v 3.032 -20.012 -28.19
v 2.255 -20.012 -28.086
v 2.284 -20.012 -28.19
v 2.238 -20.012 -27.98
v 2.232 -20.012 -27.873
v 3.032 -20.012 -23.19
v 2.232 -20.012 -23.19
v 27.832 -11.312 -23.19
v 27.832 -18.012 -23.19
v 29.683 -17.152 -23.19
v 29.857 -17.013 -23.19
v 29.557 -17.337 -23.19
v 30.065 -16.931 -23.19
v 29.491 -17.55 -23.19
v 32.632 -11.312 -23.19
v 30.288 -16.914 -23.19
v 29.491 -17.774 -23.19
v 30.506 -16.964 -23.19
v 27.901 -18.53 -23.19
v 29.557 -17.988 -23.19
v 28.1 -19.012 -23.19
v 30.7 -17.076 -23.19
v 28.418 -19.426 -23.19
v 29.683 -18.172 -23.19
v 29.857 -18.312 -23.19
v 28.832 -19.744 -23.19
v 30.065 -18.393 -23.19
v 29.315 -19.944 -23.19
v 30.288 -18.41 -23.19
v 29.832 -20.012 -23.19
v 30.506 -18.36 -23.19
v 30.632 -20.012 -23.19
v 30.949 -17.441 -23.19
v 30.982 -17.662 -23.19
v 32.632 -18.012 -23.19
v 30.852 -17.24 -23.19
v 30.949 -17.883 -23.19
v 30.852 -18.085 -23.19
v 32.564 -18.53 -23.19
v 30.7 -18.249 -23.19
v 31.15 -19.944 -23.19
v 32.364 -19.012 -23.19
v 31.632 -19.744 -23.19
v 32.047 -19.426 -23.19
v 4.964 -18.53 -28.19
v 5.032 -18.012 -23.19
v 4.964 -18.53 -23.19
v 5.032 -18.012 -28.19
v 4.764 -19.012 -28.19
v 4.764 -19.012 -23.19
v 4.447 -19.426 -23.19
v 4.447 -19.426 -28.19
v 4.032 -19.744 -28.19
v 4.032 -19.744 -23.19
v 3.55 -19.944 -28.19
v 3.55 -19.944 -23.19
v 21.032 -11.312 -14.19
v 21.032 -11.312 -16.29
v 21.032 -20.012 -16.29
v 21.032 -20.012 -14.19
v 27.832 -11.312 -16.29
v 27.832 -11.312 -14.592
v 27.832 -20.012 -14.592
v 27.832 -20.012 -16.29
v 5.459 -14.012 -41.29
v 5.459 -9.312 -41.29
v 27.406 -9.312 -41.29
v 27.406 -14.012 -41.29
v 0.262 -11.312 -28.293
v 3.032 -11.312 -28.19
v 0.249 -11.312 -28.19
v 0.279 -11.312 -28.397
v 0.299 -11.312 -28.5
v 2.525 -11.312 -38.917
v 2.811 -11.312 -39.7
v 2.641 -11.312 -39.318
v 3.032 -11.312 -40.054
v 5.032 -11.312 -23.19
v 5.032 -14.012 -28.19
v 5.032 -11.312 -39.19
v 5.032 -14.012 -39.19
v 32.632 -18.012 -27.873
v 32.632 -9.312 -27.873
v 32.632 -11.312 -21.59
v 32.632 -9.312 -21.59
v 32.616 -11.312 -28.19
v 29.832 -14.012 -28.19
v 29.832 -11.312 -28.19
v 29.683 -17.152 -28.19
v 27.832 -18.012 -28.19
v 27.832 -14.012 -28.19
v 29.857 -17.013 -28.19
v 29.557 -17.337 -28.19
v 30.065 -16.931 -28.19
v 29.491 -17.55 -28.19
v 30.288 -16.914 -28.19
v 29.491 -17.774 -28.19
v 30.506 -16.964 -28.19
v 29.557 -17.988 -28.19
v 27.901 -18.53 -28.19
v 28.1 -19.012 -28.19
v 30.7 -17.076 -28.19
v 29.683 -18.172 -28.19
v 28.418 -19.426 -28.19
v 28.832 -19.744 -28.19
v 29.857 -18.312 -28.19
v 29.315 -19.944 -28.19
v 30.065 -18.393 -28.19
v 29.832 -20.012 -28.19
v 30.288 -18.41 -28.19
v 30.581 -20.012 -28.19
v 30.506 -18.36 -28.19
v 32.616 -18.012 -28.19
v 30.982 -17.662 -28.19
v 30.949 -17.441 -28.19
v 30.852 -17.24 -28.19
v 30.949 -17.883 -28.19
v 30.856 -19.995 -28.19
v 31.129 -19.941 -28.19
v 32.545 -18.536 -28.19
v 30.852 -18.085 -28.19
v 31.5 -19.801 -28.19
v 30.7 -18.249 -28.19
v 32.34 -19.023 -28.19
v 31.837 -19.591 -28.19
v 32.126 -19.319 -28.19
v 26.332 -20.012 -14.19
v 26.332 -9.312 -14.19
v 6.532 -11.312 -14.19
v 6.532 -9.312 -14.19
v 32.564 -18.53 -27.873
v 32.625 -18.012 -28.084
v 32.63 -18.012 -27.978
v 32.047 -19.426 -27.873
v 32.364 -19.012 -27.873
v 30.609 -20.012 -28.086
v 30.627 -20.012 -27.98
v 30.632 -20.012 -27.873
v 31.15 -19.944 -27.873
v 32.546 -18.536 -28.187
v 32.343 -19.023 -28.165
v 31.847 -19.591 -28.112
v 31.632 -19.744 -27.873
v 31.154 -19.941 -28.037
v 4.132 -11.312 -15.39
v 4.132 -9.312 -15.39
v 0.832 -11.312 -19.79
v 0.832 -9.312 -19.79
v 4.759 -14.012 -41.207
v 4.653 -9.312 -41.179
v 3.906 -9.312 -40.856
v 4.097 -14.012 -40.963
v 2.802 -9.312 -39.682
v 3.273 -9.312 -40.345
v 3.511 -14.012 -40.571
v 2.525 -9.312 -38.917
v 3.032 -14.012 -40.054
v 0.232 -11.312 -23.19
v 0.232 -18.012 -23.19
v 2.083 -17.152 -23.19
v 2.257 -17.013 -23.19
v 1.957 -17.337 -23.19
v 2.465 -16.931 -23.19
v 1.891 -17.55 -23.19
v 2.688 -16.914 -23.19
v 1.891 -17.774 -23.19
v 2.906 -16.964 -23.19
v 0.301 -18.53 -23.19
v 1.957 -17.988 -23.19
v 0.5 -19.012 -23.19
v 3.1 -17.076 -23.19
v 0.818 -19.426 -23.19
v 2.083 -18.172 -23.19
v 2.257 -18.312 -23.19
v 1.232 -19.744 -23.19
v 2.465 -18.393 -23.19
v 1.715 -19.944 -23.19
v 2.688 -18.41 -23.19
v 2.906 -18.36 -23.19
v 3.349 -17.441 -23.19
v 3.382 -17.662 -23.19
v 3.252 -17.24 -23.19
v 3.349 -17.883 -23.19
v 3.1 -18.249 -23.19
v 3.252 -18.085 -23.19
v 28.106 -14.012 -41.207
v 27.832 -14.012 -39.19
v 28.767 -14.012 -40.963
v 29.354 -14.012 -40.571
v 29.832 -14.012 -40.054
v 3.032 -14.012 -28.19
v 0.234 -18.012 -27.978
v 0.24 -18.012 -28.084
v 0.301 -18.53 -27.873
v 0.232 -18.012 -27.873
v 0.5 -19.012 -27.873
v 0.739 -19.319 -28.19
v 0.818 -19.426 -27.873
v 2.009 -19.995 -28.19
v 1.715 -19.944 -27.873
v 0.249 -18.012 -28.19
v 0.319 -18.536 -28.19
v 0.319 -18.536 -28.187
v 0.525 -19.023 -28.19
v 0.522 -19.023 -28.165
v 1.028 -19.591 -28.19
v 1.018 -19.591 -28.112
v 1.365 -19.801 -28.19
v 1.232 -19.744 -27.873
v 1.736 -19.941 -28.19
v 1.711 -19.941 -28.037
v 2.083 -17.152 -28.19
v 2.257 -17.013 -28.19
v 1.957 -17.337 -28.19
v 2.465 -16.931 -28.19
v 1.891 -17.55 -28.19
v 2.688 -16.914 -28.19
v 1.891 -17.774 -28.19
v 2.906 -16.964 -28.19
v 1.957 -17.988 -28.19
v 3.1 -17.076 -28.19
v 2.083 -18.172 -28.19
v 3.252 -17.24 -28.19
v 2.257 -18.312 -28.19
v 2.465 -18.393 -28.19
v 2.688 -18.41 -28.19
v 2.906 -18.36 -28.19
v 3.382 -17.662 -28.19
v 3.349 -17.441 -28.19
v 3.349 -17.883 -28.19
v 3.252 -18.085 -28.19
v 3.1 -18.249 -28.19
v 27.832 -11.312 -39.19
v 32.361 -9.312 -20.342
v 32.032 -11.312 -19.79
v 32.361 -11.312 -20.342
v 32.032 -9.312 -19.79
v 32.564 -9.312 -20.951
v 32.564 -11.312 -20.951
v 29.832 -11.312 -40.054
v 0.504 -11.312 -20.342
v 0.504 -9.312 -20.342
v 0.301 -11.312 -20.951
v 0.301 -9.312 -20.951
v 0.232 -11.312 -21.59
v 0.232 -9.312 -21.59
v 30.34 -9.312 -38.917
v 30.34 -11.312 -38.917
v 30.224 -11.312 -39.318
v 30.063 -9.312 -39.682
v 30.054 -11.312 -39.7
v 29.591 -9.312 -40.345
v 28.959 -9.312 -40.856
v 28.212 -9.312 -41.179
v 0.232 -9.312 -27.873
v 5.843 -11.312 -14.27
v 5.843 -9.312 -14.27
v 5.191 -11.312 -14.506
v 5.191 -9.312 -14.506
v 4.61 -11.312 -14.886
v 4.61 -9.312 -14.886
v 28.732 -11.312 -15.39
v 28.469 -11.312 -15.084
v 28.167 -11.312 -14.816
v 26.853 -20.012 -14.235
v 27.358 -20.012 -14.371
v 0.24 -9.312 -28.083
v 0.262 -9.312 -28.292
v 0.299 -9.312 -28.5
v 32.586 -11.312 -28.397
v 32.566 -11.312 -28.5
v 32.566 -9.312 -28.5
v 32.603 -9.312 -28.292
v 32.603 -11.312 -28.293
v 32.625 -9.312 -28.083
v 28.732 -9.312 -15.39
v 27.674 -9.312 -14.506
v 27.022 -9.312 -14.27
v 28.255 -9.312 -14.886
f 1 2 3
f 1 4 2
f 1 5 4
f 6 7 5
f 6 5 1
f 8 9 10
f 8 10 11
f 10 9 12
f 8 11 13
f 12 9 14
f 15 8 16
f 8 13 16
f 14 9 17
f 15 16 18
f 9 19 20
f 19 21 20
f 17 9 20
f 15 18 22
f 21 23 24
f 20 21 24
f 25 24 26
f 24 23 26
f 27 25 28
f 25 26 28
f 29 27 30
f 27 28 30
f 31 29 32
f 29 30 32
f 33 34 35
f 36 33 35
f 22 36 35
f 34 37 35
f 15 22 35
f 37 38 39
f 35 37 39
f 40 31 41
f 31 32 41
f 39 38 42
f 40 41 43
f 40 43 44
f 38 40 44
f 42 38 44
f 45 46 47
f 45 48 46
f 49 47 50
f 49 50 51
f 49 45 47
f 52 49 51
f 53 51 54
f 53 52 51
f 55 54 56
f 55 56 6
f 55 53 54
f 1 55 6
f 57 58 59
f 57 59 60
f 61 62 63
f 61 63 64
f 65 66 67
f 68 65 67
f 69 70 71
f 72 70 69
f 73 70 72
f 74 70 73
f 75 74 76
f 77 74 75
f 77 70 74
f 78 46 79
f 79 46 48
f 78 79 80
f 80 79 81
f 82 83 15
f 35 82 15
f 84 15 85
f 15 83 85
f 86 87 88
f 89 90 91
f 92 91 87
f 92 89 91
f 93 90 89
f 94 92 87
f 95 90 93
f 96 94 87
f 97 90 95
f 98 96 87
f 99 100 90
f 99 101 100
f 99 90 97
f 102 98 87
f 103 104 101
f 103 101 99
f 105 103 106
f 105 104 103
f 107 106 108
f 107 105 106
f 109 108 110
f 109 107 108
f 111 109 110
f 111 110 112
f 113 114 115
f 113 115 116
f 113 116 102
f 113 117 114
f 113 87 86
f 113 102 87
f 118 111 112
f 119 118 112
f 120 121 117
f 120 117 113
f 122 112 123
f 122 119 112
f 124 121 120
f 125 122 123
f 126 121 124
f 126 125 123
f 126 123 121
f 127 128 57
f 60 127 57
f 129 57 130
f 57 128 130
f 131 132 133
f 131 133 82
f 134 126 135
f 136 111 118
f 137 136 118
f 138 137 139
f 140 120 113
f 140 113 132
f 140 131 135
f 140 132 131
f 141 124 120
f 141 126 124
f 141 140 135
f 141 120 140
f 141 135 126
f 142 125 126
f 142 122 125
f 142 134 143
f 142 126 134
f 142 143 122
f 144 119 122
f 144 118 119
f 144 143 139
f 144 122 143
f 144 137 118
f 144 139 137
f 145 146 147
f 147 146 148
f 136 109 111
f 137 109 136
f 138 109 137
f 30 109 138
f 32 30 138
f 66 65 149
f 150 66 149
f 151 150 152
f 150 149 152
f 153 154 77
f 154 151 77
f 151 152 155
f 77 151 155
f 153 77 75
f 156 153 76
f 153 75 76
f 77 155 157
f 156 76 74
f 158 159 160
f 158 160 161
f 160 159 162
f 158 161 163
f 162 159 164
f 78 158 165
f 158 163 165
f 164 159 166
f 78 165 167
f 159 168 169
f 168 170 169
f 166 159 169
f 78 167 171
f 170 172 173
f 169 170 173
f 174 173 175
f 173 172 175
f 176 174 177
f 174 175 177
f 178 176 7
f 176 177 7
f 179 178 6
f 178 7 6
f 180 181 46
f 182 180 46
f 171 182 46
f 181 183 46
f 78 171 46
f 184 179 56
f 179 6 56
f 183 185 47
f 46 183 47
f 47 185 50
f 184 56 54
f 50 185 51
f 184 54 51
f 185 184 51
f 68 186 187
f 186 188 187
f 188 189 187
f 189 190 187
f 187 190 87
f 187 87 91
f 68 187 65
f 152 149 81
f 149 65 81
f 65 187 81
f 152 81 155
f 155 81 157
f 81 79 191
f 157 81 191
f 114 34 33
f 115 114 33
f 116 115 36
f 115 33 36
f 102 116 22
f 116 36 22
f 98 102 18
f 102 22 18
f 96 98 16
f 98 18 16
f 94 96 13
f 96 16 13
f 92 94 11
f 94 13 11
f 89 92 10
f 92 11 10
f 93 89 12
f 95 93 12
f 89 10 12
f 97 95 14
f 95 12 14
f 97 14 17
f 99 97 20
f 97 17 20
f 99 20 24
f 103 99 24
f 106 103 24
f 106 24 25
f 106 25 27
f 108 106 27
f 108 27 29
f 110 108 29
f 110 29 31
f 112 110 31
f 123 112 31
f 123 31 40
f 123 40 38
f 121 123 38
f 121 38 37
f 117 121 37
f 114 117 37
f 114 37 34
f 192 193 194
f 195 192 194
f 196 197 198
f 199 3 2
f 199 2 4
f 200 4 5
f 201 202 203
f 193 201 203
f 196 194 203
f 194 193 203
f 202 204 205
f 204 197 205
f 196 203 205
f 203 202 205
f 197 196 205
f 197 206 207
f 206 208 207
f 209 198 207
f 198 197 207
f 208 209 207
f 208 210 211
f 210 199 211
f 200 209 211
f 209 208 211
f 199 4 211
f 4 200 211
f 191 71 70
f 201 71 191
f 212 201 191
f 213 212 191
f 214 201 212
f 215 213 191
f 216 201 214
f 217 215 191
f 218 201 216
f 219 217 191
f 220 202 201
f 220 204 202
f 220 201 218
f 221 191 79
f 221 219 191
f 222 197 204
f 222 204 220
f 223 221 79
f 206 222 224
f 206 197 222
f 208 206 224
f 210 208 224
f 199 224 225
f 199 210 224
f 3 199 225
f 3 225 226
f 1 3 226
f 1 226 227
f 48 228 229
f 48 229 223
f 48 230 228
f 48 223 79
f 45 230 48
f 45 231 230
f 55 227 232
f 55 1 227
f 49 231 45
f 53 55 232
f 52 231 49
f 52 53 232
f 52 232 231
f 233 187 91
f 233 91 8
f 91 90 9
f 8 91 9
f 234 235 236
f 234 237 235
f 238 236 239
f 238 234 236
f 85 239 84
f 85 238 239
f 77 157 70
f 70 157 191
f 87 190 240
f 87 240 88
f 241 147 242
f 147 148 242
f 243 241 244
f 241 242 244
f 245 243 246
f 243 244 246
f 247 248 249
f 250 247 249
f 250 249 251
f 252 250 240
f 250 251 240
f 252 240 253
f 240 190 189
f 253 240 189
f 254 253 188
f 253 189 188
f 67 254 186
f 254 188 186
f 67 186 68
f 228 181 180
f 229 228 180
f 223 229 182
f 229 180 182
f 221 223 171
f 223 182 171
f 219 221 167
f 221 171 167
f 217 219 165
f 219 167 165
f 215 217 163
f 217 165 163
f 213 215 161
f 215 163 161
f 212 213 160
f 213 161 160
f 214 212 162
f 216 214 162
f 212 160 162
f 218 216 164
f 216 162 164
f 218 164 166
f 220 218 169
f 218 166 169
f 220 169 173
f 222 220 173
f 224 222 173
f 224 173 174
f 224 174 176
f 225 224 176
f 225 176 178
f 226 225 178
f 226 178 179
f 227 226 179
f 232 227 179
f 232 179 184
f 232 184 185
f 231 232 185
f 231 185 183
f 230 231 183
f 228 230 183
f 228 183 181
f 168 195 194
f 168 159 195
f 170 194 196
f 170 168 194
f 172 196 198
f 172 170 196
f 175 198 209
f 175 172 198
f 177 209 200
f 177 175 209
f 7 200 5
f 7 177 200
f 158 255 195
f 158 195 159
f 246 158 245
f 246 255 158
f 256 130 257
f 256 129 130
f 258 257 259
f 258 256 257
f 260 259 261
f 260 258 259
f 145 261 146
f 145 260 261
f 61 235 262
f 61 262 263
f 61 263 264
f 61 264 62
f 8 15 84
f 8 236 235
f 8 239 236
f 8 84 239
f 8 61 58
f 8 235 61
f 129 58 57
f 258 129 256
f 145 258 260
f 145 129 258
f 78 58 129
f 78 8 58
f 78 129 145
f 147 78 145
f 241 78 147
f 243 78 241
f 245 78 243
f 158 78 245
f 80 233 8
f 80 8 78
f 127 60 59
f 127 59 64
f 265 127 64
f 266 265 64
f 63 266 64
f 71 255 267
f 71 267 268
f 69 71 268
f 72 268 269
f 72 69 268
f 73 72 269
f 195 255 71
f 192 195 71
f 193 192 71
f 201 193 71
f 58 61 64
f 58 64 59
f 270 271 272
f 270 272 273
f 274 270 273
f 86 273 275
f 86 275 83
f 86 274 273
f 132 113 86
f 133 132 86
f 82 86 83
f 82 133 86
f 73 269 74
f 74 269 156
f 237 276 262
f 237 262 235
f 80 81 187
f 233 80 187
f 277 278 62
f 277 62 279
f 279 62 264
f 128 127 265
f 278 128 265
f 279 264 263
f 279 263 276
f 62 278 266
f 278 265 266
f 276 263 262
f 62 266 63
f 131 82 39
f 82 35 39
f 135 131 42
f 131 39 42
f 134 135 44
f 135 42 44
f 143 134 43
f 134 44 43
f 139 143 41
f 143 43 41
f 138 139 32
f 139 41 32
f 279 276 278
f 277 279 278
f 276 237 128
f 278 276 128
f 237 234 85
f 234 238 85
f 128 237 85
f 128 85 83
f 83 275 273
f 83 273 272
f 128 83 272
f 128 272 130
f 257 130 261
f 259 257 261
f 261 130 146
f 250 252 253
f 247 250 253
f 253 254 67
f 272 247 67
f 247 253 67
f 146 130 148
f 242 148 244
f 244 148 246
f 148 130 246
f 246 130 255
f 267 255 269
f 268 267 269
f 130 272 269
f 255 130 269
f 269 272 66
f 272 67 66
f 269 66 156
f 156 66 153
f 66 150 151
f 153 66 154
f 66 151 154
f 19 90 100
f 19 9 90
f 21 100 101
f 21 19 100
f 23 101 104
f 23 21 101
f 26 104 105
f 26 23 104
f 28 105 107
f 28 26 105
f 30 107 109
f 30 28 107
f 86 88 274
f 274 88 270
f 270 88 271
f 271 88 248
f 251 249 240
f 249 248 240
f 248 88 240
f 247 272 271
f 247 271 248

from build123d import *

# Parameters (mm, degrees)
BOSS_EXTRUDE1_START     = -14.7
BOSS_EXTRUDE1_OUTLINE_W = 32.4
BOSS_EXTRUDE1_OUTLINE_H = 27.1
BOSS_EXTRUDE1_DEPTH     = 14.7
CUT_EXTRUDE1_DEPTH      = 12.7
MOVE_FACE1_BY           = 4
MOVE_FACE1_2_BY         = 4
SKETCH3_W               = 2.8
SKETCH3_H               = 13.1
CUT_EXTRUDE2_DEPTH      = 13.7
CUT_EXTRUDE3_DEPTH      = 6
SKETCH5_R               = 0.75
CUT_EXTRUDE4_DEPTH      = 43.343439739
BOSS_EXTRUDE2_DEPTH     = 2
FILLET1_R               = 3
FILLET2_R               = 3
FILLET3_START           = -21
FILLET3_DEPTH           = 13
FILLET4_START           = -21
FILLET4_DEPTH           = 13
FILLET5_R               = 3
FILLET6_R               = 3
FILLET7_R               = 2


with BuildPart() as part:
    # Boss-Extrude1: read off the stored shape, not the designer's step
    # Boss-Extrude1 outline → Boss-Extrude1 (new body)
    with BuildSketch(Plane.XZ.offset(24.012143299).offset(BOSS_EXTRUDE1_START)):
        with Locations((16.432361385, -27.739579566)):
            Rectangle(BOSS_EXTRUDE1_OUTLINE_W, BOSS_EXTRUDE1_OUTLINE_H)
    extrude(amount=BOSS_EXTRUDE1_DEPTH)

    # Sketch2 → Cut-Extrude1 (cut)
    with BuildSketch(Plane.XZ.offset(24.012143299)):
        Polygon((27.832361385, -23.189579566), (32.632361385, -23.189579566), (32.632361385, -20.589579566), (27.832361385, -20.589579566), (27.832361385, -16.289579566), (5.032361385, -16.289579566), (5.032361385, -20.589579566), (0.232361385, -20.589579566), (0.232361385, -23.189579566), (5.032361385, -23.189579566), (5.032361385, -39.189579566), (27.832361385, -39.189579566), align=None)
    extrude(amount=-CUT_EXTRUDE1_DEPTH, mode=Mode.SUBTRACT)

    # Move Face1: a face moved inward by 4.0
    extrude(part.faces().sort_by_distance((16.432361385, -24.012143299, -39.479579566))[0], amount=MOVE_FACE1_BY, dir=(0, 1, 0), mode=Mode.SUBTRACT)

    # Move Face1 2: a face moved inward by 4.0
    extrude(part.faces().sort_by_distance((16.432361385, -24.012143299, -15.789579566))[0], amount=MOVE_FACE1_2_BY, dir=(0, 1, 0), mode=Mode.SUBTRACT)

    # Sketch3 → Cut-Extrude2 (cut)
    with BuildSketch(Plane.XZ.offset(20.012143299)):
        with Locations((1.632361385, -34.739579566)):
            Rectangle(SKETCH3_W, SKETCH3_H)
        with Locations((31.232361385, -34.739579566)):
            Rectangle(SKETCH3_W, SKETCH3_H)
        Polygon((0.232361385, -20.589579566), (5.032361385, -20.589579566), (5.032361385, -16.289579566), (21.032361385, -16.289579566), (21.032361385, -14.189579566), (0.232361385, -14.189579566), align=None)
        Polygon((27.832361385, -14.189579566), (32.632361385, -14.189579566), (32.632361385, -20.589579566), (27.832361385, -20.589579566), (27.832361385, -16.289579566), align=None)
    extrude(amount=-CUT_EXTRUDE2_DEPTH, mode=Mode.SUBTRACT)

    # Sketch4 → Cut-Extrude3 (cut)
    with BuildSketch(Plane.XZ.offset(20.012143299)):
        Polygon((3.032361385, -28.189579566), (5.032361385, -28.189579566), (5.032361385, -39.189579566), (27.832361385, -39.189579566), (27.832361385, -28.189579566), (29.832361385, -28.189579566), (29.832361385, -41.289579566), (3.032361385, -41.289579566), align=None)
    extrude(amount=-CUT_EXTRUDE3_DEPTH, mode=Mode.SUBTRACT)

    # Sketch5 → Cut-Extrude4 (cut, through all)
    with BuildSketch(Plane.XY.offset(-23.189579566)):
        with Locations((2.632361385, -17.662143299)):
            Circle(SKETCH5_R)
        with Locations((30.232361385, -17.662143299)):
            Circle(SKETCH5_R)
    extrude(amount=-CUT_EXTRUDE4_DEPTH, mode=Mode.SUBTRACT)

    # Sketch6 → Boss-Extrude2 (add)
    with BuildSketch(Plane(origin=(0, -9.312143299, 0), x_dir=(1, 0, 0), z_dir=(0, 1, 0))):
        Polygon((21.032361385, 14.189579566), (5.032361385, 14.189579566), (0.232361385, 20.589579566), (5.032361385, 20.589579566), (5.032361385, 16.289579566), (21.032361385, 16.289579566), align=None)
        Polygon((0.232361385, 28.189579566), (3.032361385, 41.289579566), (3.032361385, 28.189579566), align=None)
        Polygon((29.832361385, 41.289579566), (29.832361385, 28.189579566), (32.632361385, 28.189579566), align=None)
        Polygon((27.832361385, 20.589579566), (27.832361385, 14.189579566), (32.632361385, 20.589579566), align=None)
    extrude(amount=-BOSS_EXTRUDE2_DEPTH)

    # Fillet1
    # the kernel refuses this fillet: 3 mm, written as the material it takes off along each edge
    with BuildSketch(Plane(origin=(29.832361385, -17.378495337, -41.289579566), x_dir=(0.20901925718607187, 0, 0.9779115246919747), z_dir=(0, 1, 0))) as fillet1_piece_1:
        with BuildLine():
            CenterArc((FILLET1_R * 0.808846938434, -FILLET1_R), FILLET1_R, 90, 77.935115589)
            Line((-FILLET1_R * 0.169064586258, -FILLET1_R * 0.790980742814), (0, 0))
            Line((0, 0), (FILLET1_R * 0.808846938434, 0))
        make_face()
    extrude(amount=14.132704077, mode=Mode.SUBTRACT)

    # Fillet2
    # the kernel refuses this fillet: 3 mm, written as the material it takes off along each edge
    with BuildSketch(Plane(origin=(3.032361385, -17.378495337, -41.289579566), x_dir=(1.0, 0, -8.828560948914946e-12), z_dir=(0, 1, 0))) as fillet2_piece_1:
        with BuildLine():
            CenterArc((FILLET2_R * 0.808846938434, -FILLET2_R), FILLET2_R, 89.999999999, 77.935115589)
            Line((-FILLET2_R * 0.169064586256, -FILLET2_R * 0.790980742805), (0, 0))
            Line((0, 0), (FILLET2_R * 0.808846938443, 0))
        make_face()
    extrude(amount=14.132704077, mode=Mode.SUBTRACT)

    # Fillet3: read off the stored shape, not the designer's step
    # Fillet3 outline → Fillet3 (cut)
    with BuildSketch(Plane(origin=(0, 0, 0), x_dir=(1, 0, 0), z_dir=(0, 1, 0)).offset(FILLET3_START)):
        with BuildLine():
            Line((0.232361385, 28.189579566), (0.232361385, 27.872549323))
            ThreePointArc((0.232361385, 27.872549323), (0.248973736, 28.187824027), (0.29862681, 28.499607094))
            Line((0.29862681, 28.499607094), (0.232361385, 28.189579566))
        make_face()
    extrude(amount=FILLET3_DEPTH, mode=Mode.SUBTRACT)

    # Fillet4: read off the stored shape, not the designer's step
    # Fillet4 outline → Fillet4 (cut)
    with BuildSketch(Plane(origin=(0, 0, 0), x_dir=(1, 0, 0), z_dir=(0, 1, 0)).offset(FILLET4_START)):
        with BuildLine():
            Line((32.632361385, 28.189579566), (32.566095959, 28.499607094))
            ThreePointArc((32.566095959, 28.499607094), (32.615749033, 28.187824027), (32.632361385, 27.872549323))
            Line((32.632361385, 27.872549323), (32.632361385, 28.189579566))
        make_face()
    extrude(amount=FILLET4_DEPTH, mode=Mode.SUBTRACT)

    # Fillet5
    fillet5_edges = [part.edges().sort_by_distance(p)[0] for p in [
        (32.632361385, -10.312143299, -20.589579566),
        (5.032361385, -10.312143299, -14.189579566),
        (0.232361385, -10.312143299, -20.589579566),
    ]]
    fillet(fillet5_edges, radius=FILLET5_R)

    # Fillet6
    # the kernel refuses this fillet: 3 mm, written as the material it takes off along each edge
    with BuildSketch(Plane(origin=(27.832361385, -20.312143299, -14.189579566), x_dir=(-1.0, 0, -1.4283093226823923e-11), z_dir=(0, 1, 0))) as fillet6_piece_1:
        with BuildLine():
            CenterArc((FILLET6_R * 0.500000000009, -FILLET6_R), FILLET6_R, 90.000000001, 53.130102354)
            Line((-FILLET6_R * 0.3, -FILLET6_R * 0.400000000011), (-FILLET6_R * 0.316, -FILLET6_R * 0.388000000012))
            Line((-FILLET6_R * 0.316, -FILLET6_R * 0.388000000012), (-FILLET6_R * 0.0100000000003, FILLET6_R * 0.0199999999999))
            Line((-FILLET6_R * 0.0100000000003, FILLET6_R * 0.0199999999999), (FILLET6_R * 0.499999999994, FILLET6_R * 0.02))
            Line((FILLET6_R * 0.499999999994, FILLET6_R * 0.02), (FILLET6_R * 0.499999999995, 0))
        make_face()
    extrude(amount=20, mode=Mode.SUBTRACT)

    # Fillet7
    fillet7_edges = [part.edges().sort_by_distance(p)[0] for p in [
        (0.232361385, -20.012143299, -25.531064444),
        (27.832361385, -20.012143299, -25.689579566),
        (0.236563927, -20.012143299, -28.031286811),
        (32.632361385, -20.012143299, -25.531064444),
        (32.628158843, -20.012143299, -28.031286811),
        (5.032361385, -20.012143299, -25.689579566),
    ]]
    fillet(fillet7_edges, radius=FILLET7_R)


solid = part.part
